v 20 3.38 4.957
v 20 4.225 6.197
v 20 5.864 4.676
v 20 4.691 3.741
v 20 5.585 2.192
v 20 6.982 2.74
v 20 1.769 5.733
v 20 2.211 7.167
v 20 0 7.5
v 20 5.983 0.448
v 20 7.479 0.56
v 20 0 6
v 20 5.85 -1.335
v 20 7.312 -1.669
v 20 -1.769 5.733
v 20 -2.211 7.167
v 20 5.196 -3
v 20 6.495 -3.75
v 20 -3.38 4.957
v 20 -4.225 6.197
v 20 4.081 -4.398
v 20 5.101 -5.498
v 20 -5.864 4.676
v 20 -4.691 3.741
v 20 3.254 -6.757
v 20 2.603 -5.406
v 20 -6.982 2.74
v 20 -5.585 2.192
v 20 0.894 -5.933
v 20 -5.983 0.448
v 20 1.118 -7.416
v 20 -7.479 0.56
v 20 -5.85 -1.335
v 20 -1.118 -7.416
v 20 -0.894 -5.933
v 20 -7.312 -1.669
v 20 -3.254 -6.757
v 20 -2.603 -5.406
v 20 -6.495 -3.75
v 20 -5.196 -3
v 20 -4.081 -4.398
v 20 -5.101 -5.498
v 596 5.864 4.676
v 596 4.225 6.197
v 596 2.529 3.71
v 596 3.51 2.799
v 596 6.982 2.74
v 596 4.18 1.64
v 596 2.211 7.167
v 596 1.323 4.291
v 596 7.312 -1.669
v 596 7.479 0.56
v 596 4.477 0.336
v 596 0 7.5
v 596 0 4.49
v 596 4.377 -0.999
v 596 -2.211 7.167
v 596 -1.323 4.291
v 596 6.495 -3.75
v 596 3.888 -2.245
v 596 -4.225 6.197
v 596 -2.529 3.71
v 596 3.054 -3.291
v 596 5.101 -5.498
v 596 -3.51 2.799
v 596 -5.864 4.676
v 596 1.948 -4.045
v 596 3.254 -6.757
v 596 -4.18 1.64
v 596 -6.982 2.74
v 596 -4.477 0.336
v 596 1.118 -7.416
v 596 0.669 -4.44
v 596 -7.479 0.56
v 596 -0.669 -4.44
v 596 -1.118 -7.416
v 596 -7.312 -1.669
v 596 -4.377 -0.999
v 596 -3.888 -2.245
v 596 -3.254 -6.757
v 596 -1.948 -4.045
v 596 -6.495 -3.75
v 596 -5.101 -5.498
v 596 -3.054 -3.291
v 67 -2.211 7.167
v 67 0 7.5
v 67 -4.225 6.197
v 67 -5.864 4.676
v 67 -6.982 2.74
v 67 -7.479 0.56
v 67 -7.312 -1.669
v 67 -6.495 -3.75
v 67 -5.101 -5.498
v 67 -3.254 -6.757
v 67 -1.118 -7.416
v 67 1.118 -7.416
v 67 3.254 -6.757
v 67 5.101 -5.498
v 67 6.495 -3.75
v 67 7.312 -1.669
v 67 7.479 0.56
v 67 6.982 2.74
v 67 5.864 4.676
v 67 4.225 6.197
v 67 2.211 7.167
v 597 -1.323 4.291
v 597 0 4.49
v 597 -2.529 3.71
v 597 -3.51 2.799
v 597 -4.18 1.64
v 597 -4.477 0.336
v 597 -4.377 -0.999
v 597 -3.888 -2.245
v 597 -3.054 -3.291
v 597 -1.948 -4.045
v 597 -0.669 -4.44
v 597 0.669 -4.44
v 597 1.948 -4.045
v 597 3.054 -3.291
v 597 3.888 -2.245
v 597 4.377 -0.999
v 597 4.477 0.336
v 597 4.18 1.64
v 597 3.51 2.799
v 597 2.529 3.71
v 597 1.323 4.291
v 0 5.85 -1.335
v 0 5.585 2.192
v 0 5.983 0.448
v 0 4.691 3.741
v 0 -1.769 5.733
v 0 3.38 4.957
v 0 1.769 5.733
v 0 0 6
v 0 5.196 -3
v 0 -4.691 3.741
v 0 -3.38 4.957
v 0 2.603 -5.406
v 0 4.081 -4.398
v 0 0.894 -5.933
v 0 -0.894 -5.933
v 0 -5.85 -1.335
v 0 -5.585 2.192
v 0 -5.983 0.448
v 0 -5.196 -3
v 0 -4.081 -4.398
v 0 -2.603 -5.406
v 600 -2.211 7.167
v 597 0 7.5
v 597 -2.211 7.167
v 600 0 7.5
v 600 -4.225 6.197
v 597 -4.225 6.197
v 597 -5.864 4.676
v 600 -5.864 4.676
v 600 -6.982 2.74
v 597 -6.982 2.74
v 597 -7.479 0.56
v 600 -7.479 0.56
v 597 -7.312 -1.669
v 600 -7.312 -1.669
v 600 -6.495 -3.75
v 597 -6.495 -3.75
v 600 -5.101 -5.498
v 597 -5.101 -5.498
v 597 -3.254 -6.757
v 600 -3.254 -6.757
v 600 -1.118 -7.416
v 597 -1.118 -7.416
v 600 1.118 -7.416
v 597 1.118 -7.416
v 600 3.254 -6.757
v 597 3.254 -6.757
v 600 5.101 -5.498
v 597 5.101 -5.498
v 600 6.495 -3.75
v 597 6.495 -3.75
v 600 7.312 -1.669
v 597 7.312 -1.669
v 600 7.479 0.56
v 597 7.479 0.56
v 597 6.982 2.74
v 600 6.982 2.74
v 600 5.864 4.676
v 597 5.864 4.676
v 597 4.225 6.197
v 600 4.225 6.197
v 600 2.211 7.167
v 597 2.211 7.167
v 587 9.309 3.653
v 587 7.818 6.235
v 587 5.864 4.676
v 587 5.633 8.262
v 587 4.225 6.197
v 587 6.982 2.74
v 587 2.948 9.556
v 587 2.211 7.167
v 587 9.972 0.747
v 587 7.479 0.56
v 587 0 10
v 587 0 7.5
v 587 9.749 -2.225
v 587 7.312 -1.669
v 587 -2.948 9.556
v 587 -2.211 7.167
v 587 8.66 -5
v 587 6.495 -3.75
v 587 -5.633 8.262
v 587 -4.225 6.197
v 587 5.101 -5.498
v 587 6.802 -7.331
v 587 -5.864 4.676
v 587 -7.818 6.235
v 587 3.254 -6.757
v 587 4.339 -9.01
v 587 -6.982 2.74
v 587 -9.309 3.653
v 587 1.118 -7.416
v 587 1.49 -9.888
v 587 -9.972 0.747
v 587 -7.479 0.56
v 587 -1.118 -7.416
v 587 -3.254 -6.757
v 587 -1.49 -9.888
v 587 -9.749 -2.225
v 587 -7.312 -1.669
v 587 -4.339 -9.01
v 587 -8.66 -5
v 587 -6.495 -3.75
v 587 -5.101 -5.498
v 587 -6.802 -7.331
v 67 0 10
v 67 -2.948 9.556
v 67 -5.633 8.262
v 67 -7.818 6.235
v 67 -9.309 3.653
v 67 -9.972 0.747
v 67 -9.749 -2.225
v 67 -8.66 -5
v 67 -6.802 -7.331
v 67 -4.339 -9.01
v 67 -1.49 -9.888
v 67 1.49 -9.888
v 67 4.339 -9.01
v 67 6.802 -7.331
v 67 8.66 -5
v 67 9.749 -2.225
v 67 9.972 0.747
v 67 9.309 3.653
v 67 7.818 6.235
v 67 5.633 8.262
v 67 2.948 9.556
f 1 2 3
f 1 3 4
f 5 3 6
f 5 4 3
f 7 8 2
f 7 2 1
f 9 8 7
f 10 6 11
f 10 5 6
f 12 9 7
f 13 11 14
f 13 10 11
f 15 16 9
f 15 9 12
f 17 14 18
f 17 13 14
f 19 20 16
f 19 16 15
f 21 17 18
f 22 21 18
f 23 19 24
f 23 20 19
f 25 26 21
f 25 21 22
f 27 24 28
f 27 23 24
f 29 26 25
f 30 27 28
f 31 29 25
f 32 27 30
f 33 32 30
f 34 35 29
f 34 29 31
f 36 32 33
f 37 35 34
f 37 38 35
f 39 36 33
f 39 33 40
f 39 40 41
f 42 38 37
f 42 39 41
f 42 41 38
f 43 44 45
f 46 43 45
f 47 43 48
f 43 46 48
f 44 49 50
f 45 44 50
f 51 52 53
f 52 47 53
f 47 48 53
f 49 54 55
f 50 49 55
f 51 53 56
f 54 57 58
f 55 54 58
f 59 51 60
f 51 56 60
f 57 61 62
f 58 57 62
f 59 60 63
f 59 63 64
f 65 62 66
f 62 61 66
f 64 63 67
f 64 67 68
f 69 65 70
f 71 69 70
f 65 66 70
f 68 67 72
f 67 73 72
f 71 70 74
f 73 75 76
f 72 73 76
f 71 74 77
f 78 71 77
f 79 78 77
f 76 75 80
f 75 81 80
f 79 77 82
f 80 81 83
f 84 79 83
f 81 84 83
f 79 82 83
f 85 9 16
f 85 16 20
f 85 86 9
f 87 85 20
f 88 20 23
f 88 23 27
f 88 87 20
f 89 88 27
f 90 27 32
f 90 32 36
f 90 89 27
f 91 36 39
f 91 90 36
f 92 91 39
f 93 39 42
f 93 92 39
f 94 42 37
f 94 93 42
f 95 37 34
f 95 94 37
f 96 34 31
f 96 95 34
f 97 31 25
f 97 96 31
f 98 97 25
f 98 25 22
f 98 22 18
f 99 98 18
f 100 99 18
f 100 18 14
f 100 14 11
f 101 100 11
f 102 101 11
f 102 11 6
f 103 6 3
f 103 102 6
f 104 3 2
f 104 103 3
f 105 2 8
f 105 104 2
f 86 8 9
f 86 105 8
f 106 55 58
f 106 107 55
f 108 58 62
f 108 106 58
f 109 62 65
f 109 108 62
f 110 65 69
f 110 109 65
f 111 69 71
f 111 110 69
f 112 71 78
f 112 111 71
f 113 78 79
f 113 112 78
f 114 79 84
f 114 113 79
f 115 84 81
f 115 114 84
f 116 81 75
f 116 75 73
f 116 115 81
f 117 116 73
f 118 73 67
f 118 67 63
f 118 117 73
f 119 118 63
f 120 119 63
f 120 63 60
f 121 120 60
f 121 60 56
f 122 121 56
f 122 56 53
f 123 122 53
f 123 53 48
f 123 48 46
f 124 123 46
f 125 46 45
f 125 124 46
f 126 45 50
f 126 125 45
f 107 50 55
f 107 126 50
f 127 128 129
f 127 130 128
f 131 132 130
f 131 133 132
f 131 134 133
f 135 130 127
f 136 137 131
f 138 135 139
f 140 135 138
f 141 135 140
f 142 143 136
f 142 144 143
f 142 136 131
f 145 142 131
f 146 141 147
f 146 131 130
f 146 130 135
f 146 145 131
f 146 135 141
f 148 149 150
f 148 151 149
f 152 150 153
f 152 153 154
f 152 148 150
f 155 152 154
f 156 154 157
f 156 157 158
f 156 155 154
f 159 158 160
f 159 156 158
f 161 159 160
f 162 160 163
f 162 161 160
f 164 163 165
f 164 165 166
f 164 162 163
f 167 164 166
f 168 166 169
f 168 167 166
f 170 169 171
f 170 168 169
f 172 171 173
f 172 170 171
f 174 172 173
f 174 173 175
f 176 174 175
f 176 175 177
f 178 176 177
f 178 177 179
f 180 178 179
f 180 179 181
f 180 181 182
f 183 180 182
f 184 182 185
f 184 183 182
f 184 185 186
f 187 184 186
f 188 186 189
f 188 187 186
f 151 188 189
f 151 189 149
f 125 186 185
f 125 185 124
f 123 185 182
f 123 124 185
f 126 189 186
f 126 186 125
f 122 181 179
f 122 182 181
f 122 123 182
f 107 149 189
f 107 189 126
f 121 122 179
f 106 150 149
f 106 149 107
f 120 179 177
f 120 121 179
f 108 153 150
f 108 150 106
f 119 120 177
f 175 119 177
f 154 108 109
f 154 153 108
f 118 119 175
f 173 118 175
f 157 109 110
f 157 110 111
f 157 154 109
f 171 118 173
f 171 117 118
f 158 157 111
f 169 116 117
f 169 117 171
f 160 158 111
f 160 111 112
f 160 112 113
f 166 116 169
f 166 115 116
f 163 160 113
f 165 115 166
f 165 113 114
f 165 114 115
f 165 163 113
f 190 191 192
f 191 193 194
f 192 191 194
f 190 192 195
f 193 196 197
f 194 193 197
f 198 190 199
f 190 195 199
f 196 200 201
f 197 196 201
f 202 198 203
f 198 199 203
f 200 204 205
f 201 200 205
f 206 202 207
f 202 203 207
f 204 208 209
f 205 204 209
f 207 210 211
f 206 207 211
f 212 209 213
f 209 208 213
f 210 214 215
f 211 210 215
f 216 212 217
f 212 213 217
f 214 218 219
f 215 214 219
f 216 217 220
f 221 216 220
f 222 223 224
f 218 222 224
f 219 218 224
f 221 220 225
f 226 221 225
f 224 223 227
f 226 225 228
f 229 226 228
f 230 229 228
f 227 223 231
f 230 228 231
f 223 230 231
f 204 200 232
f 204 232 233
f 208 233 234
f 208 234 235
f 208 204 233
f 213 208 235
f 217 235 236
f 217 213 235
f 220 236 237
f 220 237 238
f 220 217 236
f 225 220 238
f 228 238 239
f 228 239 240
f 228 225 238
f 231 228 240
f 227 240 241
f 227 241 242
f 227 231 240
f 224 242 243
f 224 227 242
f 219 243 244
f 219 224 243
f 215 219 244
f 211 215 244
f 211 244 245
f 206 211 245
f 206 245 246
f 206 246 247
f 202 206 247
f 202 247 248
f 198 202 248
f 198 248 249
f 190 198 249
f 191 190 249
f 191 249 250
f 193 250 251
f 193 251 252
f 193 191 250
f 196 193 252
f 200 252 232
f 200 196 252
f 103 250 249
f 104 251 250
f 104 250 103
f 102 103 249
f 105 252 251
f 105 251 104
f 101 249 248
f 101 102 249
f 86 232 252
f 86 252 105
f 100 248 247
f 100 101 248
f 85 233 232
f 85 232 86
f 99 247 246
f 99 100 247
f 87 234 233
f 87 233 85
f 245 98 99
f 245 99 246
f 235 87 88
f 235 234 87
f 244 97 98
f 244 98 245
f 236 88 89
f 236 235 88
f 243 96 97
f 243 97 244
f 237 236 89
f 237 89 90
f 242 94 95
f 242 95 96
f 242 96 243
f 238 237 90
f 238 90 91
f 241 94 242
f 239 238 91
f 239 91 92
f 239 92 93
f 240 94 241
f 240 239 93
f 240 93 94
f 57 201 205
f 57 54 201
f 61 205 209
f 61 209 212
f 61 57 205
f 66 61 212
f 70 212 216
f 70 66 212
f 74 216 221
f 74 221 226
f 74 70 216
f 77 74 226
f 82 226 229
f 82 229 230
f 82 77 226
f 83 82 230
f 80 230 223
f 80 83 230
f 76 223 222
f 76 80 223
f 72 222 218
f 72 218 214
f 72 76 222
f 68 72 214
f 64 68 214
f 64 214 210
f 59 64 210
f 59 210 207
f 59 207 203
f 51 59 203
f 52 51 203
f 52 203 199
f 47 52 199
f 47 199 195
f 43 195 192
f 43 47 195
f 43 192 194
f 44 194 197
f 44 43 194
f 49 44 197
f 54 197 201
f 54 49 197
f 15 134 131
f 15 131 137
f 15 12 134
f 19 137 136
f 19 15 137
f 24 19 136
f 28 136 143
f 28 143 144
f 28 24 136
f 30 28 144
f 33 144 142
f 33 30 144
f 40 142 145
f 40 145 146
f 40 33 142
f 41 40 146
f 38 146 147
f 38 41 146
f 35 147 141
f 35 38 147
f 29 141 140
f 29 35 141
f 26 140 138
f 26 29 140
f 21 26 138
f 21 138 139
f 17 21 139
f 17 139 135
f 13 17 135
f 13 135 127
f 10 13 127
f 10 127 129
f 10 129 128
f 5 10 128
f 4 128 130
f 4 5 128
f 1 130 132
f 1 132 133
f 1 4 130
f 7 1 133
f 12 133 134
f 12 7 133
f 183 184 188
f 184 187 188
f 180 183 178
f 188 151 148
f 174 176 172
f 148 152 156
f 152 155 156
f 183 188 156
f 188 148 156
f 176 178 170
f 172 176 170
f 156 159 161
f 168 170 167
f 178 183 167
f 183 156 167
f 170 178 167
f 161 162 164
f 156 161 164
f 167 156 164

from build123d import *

# Parameters (mm, degrees)
SKETCH_W      = 600
SKETCH_H      = 10
SKETCH001_W   = 67
SKETCH001_H   = 2.5
SKETCH002_W   = 20
SKETCH002_H   = 1.5
SKETCH003_W   = 13
SKETCH003_H   = 2.5
SKETCH003_W_2 = 1
SKETCH003_H_2 = 3.01


with BuildPart() as part:
    # Sketch → Revolution (revolve)
    with BuildSketch(Plane.XZ):
        with Locations((300, 5)):
            Rectangle(SKETCH_W, SKETCH_H)
    revolve(axis=Axis((0, 0, 0), (1, 0, 0)))

    # Sketch001 → Groove (revolve, cut)
    with BuildSketch(Plane.XZ):
        with Locations((33.5, 8.75)):
            Rectangle(SKETCH001_W, SKETCH001_H)
    revolve(axis=Axis((0, 0, 0), (1, 0, 0)), mode=Mode.SUBTRACT)

    # Sketch002 → Groove001 (revolve, cut)
    with BuildSketch(Plane.XZ):
        with Locations((10, 6.75)):
            Rectangle(SKETCH002_W, SKETCH002_H)
    revolve(axis=Axis((0, 0, 0), (1, 0, 0)), mode=Mode.SUBTRACT)

    # Sketch003 → Groove002 (revolve, cut)
    with BuildSketch(Plane.XZ):
        with Locations((593.5, 8.75)):
            Rectangle(SKETCH003_W, SKETCH003_H)
        with Locations((596.5, 5.995)):
            Rectangle(SKETCH003_W_2, SKETCH003_H_2)
    revolve(axis=Axis((0, 0, 0), (1, 0, 0)), mode=Mode.SUBTRACT)


solid = part.part
